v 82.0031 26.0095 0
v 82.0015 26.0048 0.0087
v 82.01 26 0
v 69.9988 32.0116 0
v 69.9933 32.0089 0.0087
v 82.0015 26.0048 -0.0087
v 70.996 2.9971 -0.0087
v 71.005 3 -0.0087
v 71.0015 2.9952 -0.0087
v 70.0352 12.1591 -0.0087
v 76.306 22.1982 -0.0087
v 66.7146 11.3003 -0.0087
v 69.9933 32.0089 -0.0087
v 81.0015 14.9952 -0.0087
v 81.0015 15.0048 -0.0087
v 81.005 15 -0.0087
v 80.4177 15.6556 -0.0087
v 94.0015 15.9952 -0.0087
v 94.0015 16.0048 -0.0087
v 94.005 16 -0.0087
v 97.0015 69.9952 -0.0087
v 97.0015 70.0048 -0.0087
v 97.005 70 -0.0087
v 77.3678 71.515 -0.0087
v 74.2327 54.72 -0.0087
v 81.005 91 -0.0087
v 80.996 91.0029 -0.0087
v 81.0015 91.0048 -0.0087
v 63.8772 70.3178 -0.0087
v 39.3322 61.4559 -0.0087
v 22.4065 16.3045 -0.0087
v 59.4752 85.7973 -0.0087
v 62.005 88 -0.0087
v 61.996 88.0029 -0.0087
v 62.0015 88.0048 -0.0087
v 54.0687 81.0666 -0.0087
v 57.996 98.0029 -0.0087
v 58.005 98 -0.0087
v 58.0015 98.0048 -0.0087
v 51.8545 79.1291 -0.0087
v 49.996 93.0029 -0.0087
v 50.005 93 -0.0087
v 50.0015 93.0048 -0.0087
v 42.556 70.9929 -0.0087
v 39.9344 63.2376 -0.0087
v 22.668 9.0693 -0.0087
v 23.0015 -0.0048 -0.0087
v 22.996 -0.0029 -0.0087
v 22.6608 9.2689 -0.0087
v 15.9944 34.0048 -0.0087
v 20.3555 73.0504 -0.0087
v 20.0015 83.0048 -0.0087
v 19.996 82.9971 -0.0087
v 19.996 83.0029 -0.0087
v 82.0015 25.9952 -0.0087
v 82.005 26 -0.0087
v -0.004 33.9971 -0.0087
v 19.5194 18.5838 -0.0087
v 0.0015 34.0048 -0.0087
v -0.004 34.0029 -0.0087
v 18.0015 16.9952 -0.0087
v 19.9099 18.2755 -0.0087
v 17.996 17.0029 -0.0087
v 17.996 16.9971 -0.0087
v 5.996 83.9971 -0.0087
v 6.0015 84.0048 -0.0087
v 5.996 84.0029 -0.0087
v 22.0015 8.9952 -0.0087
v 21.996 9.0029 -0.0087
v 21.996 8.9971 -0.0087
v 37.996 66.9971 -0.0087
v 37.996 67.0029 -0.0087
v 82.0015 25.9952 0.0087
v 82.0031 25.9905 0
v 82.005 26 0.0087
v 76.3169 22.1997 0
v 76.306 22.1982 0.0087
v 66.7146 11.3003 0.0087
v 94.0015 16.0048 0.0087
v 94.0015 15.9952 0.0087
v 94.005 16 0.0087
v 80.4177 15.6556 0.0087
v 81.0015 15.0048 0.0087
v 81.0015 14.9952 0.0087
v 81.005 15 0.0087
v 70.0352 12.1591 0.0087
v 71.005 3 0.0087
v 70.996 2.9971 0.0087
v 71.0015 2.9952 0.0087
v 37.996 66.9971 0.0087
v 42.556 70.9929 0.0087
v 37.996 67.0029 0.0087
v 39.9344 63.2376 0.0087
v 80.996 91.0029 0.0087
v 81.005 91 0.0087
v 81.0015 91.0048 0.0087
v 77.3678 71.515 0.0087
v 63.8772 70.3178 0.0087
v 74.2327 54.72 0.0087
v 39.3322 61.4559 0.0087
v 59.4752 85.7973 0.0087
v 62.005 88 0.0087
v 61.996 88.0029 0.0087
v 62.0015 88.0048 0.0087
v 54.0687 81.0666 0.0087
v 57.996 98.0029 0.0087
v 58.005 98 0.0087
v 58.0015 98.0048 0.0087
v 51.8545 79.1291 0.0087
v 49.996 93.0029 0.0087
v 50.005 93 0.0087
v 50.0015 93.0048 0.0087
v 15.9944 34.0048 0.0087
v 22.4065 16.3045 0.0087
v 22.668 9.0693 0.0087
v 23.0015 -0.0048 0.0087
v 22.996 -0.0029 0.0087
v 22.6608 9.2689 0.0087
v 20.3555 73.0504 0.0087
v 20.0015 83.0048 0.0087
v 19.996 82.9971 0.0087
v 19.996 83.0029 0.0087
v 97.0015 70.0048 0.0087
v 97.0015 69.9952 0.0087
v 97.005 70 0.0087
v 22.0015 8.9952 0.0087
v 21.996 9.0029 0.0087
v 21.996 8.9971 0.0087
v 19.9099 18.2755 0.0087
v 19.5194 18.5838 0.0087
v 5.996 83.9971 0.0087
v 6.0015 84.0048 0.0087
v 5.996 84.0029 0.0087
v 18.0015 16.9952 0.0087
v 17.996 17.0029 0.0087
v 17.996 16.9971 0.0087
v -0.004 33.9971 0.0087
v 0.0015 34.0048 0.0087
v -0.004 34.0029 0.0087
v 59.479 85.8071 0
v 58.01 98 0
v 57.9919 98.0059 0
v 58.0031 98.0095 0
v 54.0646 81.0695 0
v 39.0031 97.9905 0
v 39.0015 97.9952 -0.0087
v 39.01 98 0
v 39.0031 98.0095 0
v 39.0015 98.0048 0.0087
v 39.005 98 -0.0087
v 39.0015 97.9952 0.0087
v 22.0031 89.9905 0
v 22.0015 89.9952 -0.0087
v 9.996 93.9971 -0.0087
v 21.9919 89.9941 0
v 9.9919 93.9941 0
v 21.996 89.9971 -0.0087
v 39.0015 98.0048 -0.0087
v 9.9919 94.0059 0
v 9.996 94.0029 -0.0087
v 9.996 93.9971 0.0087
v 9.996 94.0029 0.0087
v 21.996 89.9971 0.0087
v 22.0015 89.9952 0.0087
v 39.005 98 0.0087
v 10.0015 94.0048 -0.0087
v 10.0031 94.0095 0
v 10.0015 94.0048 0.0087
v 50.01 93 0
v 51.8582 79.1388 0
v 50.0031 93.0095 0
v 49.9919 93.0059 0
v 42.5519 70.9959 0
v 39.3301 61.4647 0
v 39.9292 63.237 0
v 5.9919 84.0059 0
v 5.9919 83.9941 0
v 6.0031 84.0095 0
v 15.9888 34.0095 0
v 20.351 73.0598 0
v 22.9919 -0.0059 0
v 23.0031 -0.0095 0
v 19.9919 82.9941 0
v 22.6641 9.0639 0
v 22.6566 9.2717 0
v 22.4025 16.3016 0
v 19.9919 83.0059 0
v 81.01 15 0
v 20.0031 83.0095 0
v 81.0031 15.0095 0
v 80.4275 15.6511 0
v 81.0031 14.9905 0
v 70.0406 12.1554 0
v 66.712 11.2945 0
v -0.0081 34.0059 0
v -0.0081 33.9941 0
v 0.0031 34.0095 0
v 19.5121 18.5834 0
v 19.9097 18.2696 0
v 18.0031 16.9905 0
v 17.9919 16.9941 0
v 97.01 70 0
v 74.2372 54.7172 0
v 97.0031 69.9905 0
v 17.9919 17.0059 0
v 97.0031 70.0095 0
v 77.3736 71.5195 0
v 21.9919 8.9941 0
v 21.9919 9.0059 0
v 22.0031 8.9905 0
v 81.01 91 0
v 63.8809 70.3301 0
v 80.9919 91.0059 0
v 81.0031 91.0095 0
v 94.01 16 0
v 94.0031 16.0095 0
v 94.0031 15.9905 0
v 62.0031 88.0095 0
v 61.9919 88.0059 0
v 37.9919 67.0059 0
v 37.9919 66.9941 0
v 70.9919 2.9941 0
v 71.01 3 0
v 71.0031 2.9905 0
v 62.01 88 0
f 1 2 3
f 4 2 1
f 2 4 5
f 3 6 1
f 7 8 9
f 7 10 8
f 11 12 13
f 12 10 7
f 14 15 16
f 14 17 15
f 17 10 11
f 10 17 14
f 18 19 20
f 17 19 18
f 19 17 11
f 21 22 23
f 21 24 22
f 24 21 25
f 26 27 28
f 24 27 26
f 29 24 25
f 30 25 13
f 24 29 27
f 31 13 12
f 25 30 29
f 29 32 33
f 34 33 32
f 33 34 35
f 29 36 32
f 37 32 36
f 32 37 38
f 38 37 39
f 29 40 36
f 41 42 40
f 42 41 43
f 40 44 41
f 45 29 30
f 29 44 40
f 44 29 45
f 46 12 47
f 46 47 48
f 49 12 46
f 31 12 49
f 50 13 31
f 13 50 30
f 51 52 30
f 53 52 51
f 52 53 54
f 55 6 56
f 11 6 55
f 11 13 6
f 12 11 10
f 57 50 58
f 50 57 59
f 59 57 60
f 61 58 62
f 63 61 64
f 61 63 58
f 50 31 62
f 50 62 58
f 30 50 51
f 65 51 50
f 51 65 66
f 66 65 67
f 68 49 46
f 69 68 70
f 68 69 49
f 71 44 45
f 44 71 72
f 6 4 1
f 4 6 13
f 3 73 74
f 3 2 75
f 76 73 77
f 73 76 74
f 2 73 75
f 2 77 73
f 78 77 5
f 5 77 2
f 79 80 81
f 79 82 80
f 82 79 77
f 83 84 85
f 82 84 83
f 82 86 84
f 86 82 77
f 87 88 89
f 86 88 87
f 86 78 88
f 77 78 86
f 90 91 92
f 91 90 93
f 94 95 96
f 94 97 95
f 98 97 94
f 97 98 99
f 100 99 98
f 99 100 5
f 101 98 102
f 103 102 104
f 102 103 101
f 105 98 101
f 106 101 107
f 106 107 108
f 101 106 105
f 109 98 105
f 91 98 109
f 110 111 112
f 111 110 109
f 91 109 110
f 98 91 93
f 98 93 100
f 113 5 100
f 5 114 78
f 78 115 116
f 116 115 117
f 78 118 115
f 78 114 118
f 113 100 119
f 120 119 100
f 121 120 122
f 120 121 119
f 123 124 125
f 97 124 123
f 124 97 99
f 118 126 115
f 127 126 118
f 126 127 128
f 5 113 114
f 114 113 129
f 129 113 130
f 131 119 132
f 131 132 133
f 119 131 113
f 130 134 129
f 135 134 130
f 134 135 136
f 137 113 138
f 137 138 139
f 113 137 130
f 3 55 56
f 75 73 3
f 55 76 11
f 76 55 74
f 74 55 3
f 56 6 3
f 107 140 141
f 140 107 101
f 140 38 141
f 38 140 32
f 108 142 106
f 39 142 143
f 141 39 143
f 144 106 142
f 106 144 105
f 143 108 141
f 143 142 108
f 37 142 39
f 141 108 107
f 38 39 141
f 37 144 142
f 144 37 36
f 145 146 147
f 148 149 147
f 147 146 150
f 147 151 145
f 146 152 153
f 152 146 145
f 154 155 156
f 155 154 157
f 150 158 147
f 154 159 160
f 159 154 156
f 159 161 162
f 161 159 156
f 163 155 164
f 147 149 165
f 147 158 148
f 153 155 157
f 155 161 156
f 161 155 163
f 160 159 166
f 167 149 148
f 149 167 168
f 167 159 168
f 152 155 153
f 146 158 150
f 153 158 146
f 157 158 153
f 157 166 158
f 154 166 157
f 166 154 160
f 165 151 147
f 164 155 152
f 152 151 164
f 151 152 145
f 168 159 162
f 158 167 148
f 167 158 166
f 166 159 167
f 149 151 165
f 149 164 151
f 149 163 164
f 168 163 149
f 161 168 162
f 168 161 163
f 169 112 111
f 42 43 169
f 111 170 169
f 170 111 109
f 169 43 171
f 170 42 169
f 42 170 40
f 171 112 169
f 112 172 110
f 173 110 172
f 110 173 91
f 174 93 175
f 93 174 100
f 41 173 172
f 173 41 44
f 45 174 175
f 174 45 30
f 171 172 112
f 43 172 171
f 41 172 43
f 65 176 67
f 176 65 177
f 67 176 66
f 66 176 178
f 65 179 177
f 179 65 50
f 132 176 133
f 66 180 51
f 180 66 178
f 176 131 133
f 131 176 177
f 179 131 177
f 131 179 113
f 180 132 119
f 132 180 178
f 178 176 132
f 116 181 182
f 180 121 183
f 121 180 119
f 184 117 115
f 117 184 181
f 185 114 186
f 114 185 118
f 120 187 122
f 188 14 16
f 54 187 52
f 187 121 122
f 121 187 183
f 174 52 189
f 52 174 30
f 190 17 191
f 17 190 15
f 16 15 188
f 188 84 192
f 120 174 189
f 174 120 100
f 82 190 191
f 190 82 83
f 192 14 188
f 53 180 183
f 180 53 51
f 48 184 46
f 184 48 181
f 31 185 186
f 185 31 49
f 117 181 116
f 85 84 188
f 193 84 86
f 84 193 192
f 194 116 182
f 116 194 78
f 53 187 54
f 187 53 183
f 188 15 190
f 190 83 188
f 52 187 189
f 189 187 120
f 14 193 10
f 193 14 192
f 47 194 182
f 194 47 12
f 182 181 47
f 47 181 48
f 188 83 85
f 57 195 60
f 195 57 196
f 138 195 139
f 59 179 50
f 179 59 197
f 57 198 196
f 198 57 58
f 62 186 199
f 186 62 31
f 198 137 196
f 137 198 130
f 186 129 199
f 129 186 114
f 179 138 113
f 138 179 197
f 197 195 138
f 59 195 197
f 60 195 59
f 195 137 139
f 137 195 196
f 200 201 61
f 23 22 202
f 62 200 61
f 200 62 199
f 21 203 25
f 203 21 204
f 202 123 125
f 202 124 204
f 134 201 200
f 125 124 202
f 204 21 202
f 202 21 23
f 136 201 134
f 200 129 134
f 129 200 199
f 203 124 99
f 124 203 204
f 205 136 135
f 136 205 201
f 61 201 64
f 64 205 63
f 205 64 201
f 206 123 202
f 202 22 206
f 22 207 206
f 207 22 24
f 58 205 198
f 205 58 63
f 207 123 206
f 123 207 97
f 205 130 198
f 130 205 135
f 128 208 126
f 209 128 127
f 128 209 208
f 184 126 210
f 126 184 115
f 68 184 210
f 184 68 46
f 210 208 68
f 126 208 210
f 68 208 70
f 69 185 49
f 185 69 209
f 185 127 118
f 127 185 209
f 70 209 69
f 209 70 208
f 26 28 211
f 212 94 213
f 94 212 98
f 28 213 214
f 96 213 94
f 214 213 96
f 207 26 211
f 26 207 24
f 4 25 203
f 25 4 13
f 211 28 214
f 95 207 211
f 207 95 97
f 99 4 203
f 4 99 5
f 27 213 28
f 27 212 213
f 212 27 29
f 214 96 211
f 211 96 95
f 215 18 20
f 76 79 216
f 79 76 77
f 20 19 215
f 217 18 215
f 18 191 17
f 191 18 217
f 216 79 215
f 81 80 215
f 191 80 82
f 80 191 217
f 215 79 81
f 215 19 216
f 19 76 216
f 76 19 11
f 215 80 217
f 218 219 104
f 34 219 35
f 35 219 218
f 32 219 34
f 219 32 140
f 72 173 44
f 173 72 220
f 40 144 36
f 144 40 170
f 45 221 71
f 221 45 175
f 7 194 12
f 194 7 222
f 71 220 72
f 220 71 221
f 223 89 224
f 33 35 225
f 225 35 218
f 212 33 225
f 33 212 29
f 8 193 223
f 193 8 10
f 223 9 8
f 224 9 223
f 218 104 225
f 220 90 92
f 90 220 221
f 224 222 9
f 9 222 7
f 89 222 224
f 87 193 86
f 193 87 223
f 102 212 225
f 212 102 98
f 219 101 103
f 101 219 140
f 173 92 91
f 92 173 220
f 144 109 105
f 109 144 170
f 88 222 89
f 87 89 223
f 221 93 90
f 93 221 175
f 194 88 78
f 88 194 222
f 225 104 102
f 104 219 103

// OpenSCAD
color([0.5952346609945763,0.6540807806784664,0.3474259839548979]) hull(){
    translate([18,58]) sphere(0.01);
    translate([64,14]) sphere(0.01);
    translate([82,26]) sphere(0.01);
}
color([0.9928586924360654,0.247192741454632,0.70975753974483]) hull(){
    translate([58,98]) sphere(0.01);
    translate([68,15]) sphere(0.01);
    translate([42,29]) sphere(0.01);
}
color([0.13794757021236903,0.4611444179186315,0.04899626755467579]) hull(){
    translate([22,90]) sphere(0.01);
    translate([10,94]) sphere(0.01);
    translate([39,98]) sphere(0.01);
}
color([0.1977229983916683,0.036370797334404625,0.13840798504488894]) hull(){
    translate([50,93]) sphere(0.01);
    translate([58,33]) sphere(0.01);
    translate([26,22]) sphere(0.01);
}
color([0.695134065044521,0.2654011745990712,0.4635417367699751]) hull(){
    translate([44,55]) sphere(0.01);
    translate([6,84]) sphere(0.01);
    translate([18,24]) sphere(0.01);
}
color([0.14067843926211876,0.3233092624720053,0.6766209265725885]) hull(){
    translate([20,83]) sphere(0.01);
    translate([81,15]) sphere(0.01);
    translate([23,0]) sphere(0.01);
}
color([0.5598941248919586,0.2674263193966361,0.7715367321750608]) hull(){
    translate([49,34]) sphere(0.01);
    translate([0,34]) sphere(0.01);
    translate([38,4]) sphere(0.01);
}
color([0.7775867750177572,0.3358457771023752,0.7984986383285079]) hull(){
    translate([71,72]) sphere(0.01);
    translate([18,17]) sphere(0.01);
    translate([97,70]) sphere(0.01);
}
color([0.3608344962449672,0.130636609727118,0.1470050456404287]) hull(){
    translate([67,27]) sphere(0.01);
    translate([22,9]) sphere(0.01);
    translate([31,10]) sphere(0.01);
}
color([0.5817121628313788,0.46286602772829477,0.8824527290015699]) hull(){
    translate([57,62]) sphere(0.01);
    translate([81,91]) sphere(0.01);
    translate([67,16]) sphere(0.01);
}
color([0.1201105517589024,0.1938197880719691,0.4695931850983104]) hull(){
    translate([54,15]) sphere(0.01);
    translate([74,23]) sphere(0.01);
    translate([94,16]) sphere(0.01);
}
color([0.14078313852784263,0.6451769219884874,0.9811903017448982]) hull(){
    translate([71,3]) sphere(0.01);
    translate([38,67]) sphere(0.01);
    translate([62,88]) sphere(0.01);
}
